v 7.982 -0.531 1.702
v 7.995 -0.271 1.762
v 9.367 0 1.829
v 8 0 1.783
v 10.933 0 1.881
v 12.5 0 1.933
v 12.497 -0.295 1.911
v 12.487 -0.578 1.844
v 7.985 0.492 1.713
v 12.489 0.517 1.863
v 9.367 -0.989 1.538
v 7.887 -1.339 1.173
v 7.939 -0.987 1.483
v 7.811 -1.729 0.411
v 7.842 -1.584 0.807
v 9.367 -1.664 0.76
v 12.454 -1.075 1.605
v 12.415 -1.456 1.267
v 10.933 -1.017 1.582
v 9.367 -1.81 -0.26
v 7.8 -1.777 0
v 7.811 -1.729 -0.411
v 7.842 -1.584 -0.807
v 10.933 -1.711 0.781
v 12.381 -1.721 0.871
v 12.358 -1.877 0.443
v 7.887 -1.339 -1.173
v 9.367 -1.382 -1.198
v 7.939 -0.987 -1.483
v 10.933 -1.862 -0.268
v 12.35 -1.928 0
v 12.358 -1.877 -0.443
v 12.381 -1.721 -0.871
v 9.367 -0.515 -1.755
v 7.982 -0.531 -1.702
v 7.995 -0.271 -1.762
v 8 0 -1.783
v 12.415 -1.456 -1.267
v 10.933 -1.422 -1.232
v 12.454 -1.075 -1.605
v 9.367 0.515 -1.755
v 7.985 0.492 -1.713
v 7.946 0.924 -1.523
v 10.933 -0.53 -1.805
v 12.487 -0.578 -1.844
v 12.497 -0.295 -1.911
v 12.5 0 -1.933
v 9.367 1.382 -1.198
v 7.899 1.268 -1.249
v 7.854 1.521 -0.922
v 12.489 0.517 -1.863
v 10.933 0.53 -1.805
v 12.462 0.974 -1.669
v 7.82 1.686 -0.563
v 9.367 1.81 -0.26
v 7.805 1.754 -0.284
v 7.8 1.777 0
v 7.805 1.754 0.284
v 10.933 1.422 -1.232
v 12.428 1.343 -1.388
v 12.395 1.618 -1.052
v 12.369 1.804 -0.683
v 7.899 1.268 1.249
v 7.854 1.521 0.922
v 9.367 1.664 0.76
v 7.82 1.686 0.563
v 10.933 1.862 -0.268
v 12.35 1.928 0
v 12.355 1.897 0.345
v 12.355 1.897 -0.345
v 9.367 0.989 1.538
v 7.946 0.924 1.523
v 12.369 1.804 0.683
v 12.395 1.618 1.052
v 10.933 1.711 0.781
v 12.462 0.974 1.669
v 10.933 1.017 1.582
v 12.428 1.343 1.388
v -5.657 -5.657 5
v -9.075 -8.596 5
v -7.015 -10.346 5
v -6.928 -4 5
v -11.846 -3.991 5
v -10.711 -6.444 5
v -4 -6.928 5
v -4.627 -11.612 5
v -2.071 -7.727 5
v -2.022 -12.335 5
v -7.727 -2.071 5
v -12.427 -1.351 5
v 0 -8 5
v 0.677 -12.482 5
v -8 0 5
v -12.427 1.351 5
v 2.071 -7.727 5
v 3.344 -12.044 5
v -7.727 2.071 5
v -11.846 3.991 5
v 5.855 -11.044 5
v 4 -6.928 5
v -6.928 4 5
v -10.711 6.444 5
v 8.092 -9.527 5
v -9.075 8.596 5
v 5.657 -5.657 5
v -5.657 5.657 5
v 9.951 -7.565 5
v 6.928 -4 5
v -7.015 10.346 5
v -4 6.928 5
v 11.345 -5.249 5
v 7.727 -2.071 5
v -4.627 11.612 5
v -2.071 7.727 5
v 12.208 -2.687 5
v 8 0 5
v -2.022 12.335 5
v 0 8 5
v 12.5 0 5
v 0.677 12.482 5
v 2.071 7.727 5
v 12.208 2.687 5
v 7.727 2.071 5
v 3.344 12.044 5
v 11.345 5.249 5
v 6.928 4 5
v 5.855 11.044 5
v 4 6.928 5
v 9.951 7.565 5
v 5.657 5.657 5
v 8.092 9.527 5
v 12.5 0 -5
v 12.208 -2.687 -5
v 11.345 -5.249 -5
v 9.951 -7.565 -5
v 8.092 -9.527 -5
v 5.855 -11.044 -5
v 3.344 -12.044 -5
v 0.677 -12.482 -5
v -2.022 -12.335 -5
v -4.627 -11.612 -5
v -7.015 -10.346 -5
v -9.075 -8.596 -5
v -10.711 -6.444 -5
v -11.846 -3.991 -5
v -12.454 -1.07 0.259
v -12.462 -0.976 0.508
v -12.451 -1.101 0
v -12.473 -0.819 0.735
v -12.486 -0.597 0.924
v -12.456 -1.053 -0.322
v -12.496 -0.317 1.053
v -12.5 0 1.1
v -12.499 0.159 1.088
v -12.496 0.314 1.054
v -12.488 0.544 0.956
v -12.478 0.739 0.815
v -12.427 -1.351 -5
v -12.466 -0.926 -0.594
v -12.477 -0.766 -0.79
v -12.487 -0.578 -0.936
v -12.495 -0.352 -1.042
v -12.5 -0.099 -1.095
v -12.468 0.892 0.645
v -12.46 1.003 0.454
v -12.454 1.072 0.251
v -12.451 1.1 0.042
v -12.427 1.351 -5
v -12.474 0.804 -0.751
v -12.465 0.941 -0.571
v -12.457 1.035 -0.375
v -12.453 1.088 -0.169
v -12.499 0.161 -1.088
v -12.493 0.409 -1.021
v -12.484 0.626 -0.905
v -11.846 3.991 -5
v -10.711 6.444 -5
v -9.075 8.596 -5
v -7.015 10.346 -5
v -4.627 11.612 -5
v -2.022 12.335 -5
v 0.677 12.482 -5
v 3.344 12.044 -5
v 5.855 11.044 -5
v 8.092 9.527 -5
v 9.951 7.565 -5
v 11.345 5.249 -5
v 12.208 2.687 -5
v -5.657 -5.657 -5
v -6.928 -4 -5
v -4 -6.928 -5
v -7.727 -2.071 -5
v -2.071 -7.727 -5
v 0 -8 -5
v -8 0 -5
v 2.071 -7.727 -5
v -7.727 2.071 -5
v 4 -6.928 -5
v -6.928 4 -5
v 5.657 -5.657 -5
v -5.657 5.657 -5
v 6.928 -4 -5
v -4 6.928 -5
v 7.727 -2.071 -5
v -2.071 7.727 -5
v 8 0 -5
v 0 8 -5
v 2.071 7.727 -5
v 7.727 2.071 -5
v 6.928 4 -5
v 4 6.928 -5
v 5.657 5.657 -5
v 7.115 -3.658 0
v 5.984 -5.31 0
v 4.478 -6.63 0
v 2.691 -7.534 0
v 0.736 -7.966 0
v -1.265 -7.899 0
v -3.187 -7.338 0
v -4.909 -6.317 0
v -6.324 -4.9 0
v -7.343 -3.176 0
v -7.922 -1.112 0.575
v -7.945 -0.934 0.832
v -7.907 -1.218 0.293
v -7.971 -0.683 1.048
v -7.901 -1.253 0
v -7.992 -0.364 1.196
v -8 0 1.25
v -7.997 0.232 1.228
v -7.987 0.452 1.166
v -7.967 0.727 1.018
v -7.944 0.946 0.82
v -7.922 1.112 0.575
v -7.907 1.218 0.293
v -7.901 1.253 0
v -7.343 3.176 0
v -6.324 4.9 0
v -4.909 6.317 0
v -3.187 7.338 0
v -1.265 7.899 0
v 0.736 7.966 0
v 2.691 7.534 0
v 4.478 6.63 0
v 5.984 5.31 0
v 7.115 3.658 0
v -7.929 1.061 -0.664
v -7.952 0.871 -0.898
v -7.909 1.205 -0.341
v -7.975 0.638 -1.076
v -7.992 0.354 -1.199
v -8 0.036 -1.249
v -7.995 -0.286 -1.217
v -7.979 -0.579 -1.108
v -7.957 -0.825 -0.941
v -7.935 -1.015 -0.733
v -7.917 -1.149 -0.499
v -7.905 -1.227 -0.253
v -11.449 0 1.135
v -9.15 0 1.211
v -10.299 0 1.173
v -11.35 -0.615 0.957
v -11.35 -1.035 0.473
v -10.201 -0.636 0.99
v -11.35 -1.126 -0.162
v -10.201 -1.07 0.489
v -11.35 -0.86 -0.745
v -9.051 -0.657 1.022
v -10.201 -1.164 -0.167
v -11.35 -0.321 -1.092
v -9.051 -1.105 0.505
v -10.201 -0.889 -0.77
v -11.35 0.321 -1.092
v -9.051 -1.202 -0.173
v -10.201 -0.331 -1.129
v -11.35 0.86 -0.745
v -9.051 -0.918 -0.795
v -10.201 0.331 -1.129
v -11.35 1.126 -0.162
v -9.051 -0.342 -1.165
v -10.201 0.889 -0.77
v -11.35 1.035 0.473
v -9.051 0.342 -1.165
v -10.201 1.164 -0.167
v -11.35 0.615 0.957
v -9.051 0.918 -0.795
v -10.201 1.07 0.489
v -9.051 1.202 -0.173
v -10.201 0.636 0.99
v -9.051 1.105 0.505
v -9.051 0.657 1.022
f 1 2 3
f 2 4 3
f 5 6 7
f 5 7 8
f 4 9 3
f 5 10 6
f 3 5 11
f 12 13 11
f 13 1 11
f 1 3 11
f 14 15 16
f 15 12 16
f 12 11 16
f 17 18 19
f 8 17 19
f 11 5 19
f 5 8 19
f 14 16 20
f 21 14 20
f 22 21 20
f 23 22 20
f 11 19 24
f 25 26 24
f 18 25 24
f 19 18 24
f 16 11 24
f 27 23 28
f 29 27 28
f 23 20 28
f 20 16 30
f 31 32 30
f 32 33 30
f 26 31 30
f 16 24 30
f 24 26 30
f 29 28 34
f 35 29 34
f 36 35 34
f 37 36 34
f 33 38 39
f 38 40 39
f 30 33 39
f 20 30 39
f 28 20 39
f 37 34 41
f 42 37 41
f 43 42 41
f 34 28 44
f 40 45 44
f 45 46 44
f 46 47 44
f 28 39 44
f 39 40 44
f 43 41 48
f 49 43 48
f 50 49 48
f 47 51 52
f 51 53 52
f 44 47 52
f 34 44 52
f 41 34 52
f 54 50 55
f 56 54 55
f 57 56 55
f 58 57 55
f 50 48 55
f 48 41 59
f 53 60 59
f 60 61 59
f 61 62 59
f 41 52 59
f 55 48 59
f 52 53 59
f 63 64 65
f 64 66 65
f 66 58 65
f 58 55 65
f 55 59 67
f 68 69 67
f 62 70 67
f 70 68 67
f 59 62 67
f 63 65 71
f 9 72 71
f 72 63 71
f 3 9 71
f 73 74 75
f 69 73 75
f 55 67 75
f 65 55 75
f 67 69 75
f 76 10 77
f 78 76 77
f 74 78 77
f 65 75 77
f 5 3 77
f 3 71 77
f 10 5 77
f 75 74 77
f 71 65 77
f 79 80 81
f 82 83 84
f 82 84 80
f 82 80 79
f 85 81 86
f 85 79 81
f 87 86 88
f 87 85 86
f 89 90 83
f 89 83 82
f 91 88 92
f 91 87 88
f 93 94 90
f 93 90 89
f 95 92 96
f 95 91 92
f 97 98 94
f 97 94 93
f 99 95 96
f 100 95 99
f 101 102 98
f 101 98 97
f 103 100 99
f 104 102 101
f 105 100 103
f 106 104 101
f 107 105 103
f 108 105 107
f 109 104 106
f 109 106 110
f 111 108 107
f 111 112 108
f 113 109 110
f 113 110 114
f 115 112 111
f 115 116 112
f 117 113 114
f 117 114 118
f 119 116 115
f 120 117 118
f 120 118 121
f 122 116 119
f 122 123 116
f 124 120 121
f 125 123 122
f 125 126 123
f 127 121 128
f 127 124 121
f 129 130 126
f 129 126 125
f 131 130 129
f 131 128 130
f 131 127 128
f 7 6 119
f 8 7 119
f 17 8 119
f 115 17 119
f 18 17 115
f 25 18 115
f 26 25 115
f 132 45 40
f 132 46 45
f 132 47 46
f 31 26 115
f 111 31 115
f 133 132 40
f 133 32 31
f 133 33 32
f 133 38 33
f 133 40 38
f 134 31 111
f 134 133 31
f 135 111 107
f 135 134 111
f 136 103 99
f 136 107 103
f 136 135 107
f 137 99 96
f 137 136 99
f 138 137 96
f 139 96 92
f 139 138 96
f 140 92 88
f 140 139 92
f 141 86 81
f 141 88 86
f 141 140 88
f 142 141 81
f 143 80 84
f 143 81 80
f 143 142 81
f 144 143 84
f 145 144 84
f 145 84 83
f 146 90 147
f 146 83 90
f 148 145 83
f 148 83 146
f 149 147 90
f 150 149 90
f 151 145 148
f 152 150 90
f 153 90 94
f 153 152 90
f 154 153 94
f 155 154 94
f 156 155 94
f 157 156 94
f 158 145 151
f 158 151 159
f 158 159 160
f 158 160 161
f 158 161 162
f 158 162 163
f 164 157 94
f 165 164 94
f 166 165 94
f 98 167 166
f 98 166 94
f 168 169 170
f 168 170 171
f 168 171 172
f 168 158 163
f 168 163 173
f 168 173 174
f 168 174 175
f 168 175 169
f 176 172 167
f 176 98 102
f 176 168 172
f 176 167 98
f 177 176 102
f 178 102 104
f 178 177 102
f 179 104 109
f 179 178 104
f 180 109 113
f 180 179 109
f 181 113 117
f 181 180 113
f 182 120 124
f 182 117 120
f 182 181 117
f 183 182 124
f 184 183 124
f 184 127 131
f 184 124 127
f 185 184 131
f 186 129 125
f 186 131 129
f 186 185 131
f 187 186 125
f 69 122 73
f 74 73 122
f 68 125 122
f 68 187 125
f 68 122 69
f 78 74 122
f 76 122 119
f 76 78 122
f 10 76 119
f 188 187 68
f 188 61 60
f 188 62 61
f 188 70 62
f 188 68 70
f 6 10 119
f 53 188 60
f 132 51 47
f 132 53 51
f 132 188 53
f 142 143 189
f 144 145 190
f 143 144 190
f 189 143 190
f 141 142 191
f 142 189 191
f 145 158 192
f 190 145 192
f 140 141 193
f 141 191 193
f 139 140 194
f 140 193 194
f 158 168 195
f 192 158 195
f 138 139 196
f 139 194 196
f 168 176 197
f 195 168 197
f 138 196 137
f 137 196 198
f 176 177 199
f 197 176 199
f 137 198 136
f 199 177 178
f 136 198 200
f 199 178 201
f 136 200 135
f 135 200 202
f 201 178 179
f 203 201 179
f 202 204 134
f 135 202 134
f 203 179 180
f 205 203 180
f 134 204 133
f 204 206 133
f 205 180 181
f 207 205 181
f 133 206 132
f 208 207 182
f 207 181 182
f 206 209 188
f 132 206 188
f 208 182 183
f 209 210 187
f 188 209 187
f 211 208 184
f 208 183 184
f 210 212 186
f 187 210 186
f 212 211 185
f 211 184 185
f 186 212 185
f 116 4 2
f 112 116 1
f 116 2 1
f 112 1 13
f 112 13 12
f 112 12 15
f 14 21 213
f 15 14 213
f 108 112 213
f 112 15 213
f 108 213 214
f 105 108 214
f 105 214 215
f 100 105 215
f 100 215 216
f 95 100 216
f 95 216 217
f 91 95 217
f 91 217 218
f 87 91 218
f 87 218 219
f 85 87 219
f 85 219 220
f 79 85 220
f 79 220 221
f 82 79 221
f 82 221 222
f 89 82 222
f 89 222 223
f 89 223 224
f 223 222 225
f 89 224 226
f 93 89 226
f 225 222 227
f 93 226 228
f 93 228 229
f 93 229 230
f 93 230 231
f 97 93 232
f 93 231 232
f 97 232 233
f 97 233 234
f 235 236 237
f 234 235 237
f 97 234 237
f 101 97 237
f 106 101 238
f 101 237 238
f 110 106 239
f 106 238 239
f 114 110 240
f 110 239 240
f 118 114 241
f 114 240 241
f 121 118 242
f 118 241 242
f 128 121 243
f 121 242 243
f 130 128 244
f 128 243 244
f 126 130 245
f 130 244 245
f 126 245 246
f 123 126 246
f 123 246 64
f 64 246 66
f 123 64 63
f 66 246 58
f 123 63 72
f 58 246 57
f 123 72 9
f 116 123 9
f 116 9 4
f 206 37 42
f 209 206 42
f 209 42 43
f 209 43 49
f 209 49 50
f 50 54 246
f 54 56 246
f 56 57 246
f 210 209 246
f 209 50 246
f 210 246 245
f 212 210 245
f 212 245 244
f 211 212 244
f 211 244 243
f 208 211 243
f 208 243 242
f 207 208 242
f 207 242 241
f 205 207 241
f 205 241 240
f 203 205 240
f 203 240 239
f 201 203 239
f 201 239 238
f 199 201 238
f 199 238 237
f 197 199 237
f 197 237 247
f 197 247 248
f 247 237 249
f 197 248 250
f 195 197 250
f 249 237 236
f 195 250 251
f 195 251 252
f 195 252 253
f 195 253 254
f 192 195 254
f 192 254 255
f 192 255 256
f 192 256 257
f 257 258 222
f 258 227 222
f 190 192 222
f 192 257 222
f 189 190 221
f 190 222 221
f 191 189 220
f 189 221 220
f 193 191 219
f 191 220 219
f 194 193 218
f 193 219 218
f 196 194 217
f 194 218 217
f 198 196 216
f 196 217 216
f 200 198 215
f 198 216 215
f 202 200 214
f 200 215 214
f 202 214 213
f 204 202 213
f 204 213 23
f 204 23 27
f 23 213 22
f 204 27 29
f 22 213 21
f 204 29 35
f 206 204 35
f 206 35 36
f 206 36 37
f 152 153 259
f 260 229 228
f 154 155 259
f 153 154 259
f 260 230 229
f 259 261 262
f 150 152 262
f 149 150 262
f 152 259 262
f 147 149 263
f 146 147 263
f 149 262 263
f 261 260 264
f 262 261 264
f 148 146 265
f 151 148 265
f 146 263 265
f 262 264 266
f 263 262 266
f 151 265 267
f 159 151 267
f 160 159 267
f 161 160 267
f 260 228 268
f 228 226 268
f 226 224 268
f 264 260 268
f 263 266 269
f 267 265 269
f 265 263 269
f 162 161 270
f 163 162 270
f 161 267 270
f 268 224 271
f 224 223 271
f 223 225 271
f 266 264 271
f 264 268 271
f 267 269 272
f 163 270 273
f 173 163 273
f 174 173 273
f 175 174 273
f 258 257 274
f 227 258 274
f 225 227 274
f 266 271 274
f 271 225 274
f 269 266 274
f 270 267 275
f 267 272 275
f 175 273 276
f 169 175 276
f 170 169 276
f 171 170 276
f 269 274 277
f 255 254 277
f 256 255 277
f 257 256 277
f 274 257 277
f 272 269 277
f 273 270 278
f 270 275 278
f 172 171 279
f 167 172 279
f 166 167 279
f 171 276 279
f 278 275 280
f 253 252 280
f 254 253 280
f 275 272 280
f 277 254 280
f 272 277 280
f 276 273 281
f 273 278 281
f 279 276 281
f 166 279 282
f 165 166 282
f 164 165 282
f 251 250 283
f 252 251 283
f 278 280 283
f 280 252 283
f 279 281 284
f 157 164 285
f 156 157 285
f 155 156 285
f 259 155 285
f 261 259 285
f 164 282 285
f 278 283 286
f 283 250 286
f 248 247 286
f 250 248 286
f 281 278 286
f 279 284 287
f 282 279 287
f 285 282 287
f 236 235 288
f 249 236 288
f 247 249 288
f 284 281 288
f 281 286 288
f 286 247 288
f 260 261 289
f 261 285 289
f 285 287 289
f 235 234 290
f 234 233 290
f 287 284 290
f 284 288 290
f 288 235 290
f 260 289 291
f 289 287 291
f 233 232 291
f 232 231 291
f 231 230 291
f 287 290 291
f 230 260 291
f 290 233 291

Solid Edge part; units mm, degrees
sketch "Sketch1" plane through (0, 0, 0) normal (0, 0, 1) x (1, 0, 0)
  circle A0 centre (0, 0) radius 12.5
extrude "ExtrudedProtrusion_1" add sketch "Sketch1" along normal mid plane 10
sketch "Sketch2" plane through (0, 0, 0) normal (0, 0, 1) x (1, 0, 0)
  circle A0 centre (0, 0) radius 8
extrude "ExtrudedCutout_1" cut sketch "Sketch2" along normal mid plane 61.0802
sketch "Sketch3" plane through (0, 0, 0) normal (0, -1, 0) x (1, 0, 0)
  line L0 (14.5, 0) -> (14.5, 2)
  line L1 (14.5, 2) -> (-14.5, 1.0329)
  line L2 (-14.5, 1.0329) -> (-14.5, 0)
  line L3 (14.5, 0) -> (-14.5, 0)
  line L4 (0, 0) -> (14.5, 0)
revolve "RevolvedProtrusion_1" cut sketch "Sketch3" angle 360 about axis through (12.5, 0, 0) along (-1, 0, 0)
